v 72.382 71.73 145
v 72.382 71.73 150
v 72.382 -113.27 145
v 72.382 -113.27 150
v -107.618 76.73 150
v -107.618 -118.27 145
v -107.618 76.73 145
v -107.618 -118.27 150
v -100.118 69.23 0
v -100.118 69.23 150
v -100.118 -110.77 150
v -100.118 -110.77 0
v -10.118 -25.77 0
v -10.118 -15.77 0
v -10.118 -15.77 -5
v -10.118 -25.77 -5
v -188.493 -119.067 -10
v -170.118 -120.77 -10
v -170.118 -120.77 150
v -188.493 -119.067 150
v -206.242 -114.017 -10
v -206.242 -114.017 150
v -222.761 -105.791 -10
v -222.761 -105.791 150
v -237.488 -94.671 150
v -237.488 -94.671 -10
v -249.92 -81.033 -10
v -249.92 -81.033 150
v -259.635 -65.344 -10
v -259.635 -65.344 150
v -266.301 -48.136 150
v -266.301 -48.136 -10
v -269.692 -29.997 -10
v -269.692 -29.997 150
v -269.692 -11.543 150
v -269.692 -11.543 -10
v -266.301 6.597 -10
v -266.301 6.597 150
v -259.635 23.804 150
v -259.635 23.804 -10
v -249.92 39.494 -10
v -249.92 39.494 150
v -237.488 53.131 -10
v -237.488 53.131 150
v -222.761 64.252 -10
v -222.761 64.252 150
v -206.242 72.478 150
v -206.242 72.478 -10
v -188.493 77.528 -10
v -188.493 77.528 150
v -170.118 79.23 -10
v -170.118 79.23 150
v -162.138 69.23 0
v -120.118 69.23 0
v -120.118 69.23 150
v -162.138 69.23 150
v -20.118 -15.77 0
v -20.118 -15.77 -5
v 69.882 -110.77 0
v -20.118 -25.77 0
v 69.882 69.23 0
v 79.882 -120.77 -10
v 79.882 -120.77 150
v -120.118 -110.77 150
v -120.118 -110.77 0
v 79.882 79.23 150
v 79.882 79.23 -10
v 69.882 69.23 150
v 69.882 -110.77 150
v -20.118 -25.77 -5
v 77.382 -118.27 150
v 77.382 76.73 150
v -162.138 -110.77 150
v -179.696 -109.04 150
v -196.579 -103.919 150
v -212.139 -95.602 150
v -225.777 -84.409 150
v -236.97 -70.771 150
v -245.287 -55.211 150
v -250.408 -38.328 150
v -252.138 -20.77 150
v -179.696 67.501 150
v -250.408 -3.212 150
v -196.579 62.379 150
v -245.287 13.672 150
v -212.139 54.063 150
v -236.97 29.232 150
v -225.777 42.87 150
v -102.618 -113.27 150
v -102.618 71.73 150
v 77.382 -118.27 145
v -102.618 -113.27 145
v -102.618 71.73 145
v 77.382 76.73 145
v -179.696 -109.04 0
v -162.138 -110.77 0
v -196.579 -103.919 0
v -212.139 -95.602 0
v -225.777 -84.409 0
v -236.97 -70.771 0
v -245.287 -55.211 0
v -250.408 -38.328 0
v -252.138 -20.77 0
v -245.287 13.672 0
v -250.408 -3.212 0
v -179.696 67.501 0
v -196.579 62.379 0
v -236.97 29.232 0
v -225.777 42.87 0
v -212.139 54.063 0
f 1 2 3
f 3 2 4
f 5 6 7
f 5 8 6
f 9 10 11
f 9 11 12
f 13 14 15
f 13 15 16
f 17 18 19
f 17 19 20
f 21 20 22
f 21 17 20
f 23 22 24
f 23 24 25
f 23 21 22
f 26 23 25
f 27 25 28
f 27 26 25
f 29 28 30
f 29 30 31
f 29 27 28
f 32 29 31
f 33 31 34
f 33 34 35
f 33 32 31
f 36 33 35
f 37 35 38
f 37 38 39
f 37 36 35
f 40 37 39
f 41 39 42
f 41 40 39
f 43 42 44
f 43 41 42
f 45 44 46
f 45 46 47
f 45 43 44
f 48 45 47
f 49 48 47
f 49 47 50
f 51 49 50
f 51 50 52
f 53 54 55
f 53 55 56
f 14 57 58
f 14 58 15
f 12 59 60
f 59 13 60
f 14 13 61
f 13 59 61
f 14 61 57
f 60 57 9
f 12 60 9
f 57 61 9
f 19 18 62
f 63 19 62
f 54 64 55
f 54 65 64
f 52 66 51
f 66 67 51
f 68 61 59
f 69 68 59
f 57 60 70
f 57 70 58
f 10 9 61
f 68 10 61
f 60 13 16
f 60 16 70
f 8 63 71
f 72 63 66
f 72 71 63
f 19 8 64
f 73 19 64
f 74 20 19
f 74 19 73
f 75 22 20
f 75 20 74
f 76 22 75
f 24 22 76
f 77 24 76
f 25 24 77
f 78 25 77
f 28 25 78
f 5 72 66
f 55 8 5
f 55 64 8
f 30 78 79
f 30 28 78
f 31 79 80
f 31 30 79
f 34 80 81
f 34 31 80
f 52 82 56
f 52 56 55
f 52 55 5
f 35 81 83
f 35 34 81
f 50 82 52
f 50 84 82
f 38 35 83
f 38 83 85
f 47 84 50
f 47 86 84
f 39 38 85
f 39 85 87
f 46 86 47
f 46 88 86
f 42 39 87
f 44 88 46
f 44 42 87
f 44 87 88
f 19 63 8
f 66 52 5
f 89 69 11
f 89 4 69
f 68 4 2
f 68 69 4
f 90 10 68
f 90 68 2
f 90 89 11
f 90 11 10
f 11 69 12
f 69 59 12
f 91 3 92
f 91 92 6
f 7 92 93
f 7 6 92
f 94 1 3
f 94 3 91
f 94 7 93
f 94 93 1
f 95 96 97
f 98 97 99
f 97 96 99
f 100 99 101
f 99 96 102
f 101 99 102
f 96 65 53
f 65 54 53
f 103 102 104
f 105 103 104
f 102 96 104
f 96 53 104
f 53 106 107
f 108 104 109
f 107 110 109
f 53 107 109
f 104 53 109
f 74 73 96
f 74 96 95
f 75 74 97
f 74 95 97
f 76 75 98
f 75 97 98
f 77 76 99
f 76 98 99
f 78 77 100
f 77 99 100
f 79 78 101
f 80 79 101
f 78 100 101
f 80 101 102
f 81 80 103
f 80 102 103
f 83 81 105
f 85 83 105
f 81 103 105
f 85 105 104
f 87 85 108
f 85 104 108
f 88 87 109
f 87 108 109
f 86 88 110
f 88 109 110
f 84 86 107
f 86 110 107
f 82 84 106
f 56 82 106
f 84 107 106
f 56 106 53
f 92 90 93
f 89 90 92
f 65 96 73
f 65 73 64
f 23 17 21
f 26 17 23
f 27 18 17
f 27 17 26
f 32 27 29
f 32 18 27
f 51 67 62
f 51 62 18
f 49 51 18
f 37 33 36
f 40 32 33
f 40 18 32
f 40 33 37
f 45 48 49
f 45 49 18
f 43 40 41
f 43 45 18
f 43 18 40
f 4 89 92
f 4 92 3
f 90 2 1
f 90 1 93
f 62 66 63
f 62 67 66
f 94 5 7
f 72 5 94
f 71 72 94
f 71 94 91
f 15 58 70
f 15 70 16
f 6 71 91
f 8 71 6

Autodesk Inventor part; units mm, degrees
ref_plane "YZ Plane" through (0, 0, 0) normal (1, 0, 0) x (0, 1, 0)
ref_plane "XZ Plane" through (0, 0, 0) normal (0, 1, 0) x (-1, 0, 0)
ref_plane "XY Plane" through (0, 0, 0) normal (0, 0, 1) x (1, 0, 0)
sketch "Skizze1" plane through (0, 0, 0) normal (0, 0, 1) x (1, 0, 0)
  line L0 (-160.1182, 0) -> (119.8818, 0) projected
  line L1 (0, -160.7697) -> (0, 119.2303) projected
  line L2 (-120.1182, 79.2303) -> (79.8818, 79.2303)
  line L3 (79.8818, 79.2303) -> (79.8818, -120.7697)
  line L4 (79.8818, -120.7697) -> (-120.1182, -120.7697)
  line L5 (-120.1182, -120.7697) -> (-120.1182, 79.2303)
  line L6 (-110.1182, 69.2303) -> (69.8818, 69.2303)
  line L7 (69.8818, 69.2303) -> (69.8818, -110.7697)
  line L8 (69.8818, -110.7697) -> (-110.1182, -110.7697)
  line L9 (-110.1182, -110.7697) -> (-110.1182, 69.2303)
  point P0 (0, 0)
  dimension "d0" = 200
  dimension "d1" = 200
  dimension "d2" = 10
  dimension "d3" = 10
  dimension "d4" = 10
  dimension "d5" = 10
extrude "Extrusion1" add sketch "Skizze1" along normal blind 150 contours L5 L2 L1 L6 L9 L0 | L0 L9 L8 L1 L4 L5 | L1 L8 L7 L0 L3 L4 | L2 L3 L0 L7 L6 L1
sketch "Skizze2" plane through (-120.1182, -120.7697, 0) normal (-1, 0, 0) x (0, 0, 1)
  point P0 (0, 120.7697)
sketch "Skizze3" plane through (-120.1182, -120.7697, 0) normal (-1, 0, 0) x (0, 0, 1)
  point P0 (0, 120.7697)
sketch "Skizze4" plane through (-120.1182, -120.7697, 0) normal (-1, 0, 0) x (0, 0, 1)
  point P0 (0, 120.7697)
sketch "Skizze5" plane through (-120.1182, -120.7697, 0) normal (-1, 0, 0) x (0, 0, 1)
  point P0 (0, 120.7697)
sketch "Skizze6" plane through (-120.1182, -120.7697, 0) normal (-1, 0, 0) x (0, 0, 1)
  point P0 (0, 120.7697)
sketch "Skizze7" plane through (0, 0, 0) normal (0, 0, -1) x (-1, 0, 0)
  line L0 (120.1182, 79.2303) -> (120.1182, -120.7697) projected
  line L1 (120.1182, 79.2303) -> (170.1182, 79.2303)
  line L2 (170.1182, -120.7697) -> (120.1182, -120.7697)
  line L3 (120.1182, -120.7697) -> (120.1182, 79.2303)
  arc A0 (170.1182, -120.7697) -> (170.1182, 79.2303) centre (170.1182, -20.7697) ccw
  line L4 (120.1182, 69.2303) -> (162.1378, 69.2303)
  line L5 (162.1378, -110.7697) -> (120.1182, -110.7697)
  line L6 (120.1182, -110.7697) -> (120.1182, 69.2303)
  arc A1 (162.1378, -110.7697) -> (162.1378, 69.2303) centre (162.1378, -20.7697) ccw
  point P0 (0, 0)
  dimension "d9" = 10
  dimension "d10" = 10
extrude "Extrusion2" add sketch "Skizze7" against normal blind 150 contours L1 A0 L2 L0 L5 A1 L4
sketch "Skizze8" plane through (-110.1182, -110.7697, 0) normal (1, 0, 0) x (0, 0, -1)
  line L0 (-150, 0) -> (-150, 180) projected
  line L1 (0, 0) -> (0, 180) projected
  line L2 (-150, 0) -> (0, 0)
  line L3 (0, 0) -> (0, 180)
  line L4 (0, 180) -> (-150, 180)
  line L5 (-150, 180) -> (-150, 0)
  point P0 (0, 110.7697)
extrude "Extrusion3" add sketch "Skizze8" along normal blind 10
sketch "Skizze9" plane through (0, 0, 0) normal (0, 0, -1) x (-1, 0, 0)
  line L0 (-79.8818, 79.2303) -> (170.1182, 79.2303) projected
  line L1 (-79.8818, 79.2303) -> (120.1182, 79.2303)
  line L2 (120.1182, 79.2303) -> (120.1182, -110.7697)
  line L3 (120.1182, -110.7697) -> (-79.8818, -110.7697)
  line L4 (-79.8818, -110.7697) -> (-79.8818, 79.2303)
  arc A0 (170.1182, -120.7697) -> (170.1182, 79.2303) centre (170.1182, -20.7697) ccw projected
  arc A1 (170.1182, -120.7697) -> (170.1182, 79.2303) centre (170.1182, -20.7697) ccw
  line L5 (120.1182, 79.2303) -> (170.1182, 79.2303)
  line L6 (-79.8818, -120.7697) -> (170.1182, -120.7697) projected
  line L7 (120.1182, -120.7697) -> (170.1182, -120.7697)
  line L8 (120.1182, -110.7697) -> (-79.8818, -110.7697)
  line L9 (-79.8818, -110.7697) -> (-79.8818, -120.7697)
  line L10 (-79.8818, -120.7697) -> (120.1182, -120.7697)
  line L11 (120.1182, -120.7697) -> (120.1182, -110.7697)
  point P0 (0, 0)
  point P1 (-79.8818, -110.7697)
extrude "Extrusion4" add sketch "Skizze9" along normal blind 10
sketch "Skizze10" plane through (0, 0, 150) normal (0, 0, 1) x (1, 0, 0)
  point P0 (0, 0)
sketch "Skizze11" plane through (0, 0, 150) normal (0, 0, 1) x (1, 0, 0)
  line L0 (-107.6182, 76.7303) -> (77.3818, 76.7303)
  line L1 (77.3818, 76.7303) -> (77.3818, 71.09)
  line L2 (72.3818, 71.7303) -> (-102.6182, 71.7303)
  line L3 (-107.6182, 71.09) -> (-107.6182, 76.7303)
  line L4 (77.3818, -113.2626) -> (77.3818, -118.2697)
  line L5 (77.3818, -118.2697) -> (-107.6182, -118.2697)
  line L6 (-107.6182, -118.2697) -> (-107.6182, -113.2626)
  line L7 (77.3818, -113.2626) -> (77.3818, 71.09)
  line L8 (72.3818, 71.7303) -> (72.3818, -113.2697)
  line L9 (-102.6182, 71.7303) -> (-102.6182, -113.2697)
  line L10 (-107.6182, -113.2626) -> (-107.6182, 71.09)
  line L11 (-107.6182, -113.2626) -> (-107.6182, -113.2626)
  line L12 (-102.6182, -113.2697) -> (72.3818, -113.2697)
  line L13 (77.3818, -113.2626) -> (77.3818, -113.2626)
  line L14 (79.8818, 79.2303) -> (-170.1182, 79.2303) projected
  line L15 (79.8818, -120.7697) -> (79.8818, 79.2303) projected
  line L16 (-100.1182, 69.2303) -> (69.8818, 69.2303) projected
  line L17 (69.8818, 69.2303) -> (69.8818, -110.7697) projected
  line L18 (69.8818, -110.7697) -> (-100.1182, -110.7697) projected
  line L19 (-170.1182, -120.7697) -> (79.8818, -120.7697) projected
  line L20 (-100.1182, 69.2303) -> (-100.1182, -110.7697) projected
  point P0 (0, 0)
  dimension "d17" = 2.5
  dimension "d18" = 2.5
  dimension "d19" = 2.5
  dimension "d20" = 2.5
  dimension "d21" = 2.5
  dimension "d22" = 2.5
  dimension "d23" = 2.5
  dimension "d24" = 2.5
  dimension "d25" = 5
  dimension "d26" = 5
extrude "Extrusion5" cut sketch "Skizze11" against normal blind 5 contours L0 L1 L7 L4 L5 L6 L10 L3
sketch "Skizze12" plane through (0, 0, 0) normal (0, 0, 1) x (1, 0, 0)
  line L0 (-100.1182, 69.2303) -> (69.8818, 69.2303) projected
  line L1 (69.8818, 69.2303) -> (69.8818, -110.7697) projected
  line L2 (-20.1182, -15.7697) -> (-10.1182, -15.7697)
  line L3 (-10.1182, -15.7697) -> (-10.1182, -25.7697)
  line L4 (-10.1182, -25.7697) -> (-20.1182, -25.7697)
  line L5 (-20.1182, -25.7697) -> (-20.1182, -15.7697)
  point P0 (0, 0)
  point P1 (-15.1182, -20.7697)
  dimension "d29" = 90
  dimension "d30" = 85
  dimension "d31" = 5
  dimension "d32" = 5
  dimension "d33" = 5
  dimension "d34" = 5
extrude "Extrusion6" cut sketch "Skizze12" against normal blind 5
properties part number "BetterPrototyp"
